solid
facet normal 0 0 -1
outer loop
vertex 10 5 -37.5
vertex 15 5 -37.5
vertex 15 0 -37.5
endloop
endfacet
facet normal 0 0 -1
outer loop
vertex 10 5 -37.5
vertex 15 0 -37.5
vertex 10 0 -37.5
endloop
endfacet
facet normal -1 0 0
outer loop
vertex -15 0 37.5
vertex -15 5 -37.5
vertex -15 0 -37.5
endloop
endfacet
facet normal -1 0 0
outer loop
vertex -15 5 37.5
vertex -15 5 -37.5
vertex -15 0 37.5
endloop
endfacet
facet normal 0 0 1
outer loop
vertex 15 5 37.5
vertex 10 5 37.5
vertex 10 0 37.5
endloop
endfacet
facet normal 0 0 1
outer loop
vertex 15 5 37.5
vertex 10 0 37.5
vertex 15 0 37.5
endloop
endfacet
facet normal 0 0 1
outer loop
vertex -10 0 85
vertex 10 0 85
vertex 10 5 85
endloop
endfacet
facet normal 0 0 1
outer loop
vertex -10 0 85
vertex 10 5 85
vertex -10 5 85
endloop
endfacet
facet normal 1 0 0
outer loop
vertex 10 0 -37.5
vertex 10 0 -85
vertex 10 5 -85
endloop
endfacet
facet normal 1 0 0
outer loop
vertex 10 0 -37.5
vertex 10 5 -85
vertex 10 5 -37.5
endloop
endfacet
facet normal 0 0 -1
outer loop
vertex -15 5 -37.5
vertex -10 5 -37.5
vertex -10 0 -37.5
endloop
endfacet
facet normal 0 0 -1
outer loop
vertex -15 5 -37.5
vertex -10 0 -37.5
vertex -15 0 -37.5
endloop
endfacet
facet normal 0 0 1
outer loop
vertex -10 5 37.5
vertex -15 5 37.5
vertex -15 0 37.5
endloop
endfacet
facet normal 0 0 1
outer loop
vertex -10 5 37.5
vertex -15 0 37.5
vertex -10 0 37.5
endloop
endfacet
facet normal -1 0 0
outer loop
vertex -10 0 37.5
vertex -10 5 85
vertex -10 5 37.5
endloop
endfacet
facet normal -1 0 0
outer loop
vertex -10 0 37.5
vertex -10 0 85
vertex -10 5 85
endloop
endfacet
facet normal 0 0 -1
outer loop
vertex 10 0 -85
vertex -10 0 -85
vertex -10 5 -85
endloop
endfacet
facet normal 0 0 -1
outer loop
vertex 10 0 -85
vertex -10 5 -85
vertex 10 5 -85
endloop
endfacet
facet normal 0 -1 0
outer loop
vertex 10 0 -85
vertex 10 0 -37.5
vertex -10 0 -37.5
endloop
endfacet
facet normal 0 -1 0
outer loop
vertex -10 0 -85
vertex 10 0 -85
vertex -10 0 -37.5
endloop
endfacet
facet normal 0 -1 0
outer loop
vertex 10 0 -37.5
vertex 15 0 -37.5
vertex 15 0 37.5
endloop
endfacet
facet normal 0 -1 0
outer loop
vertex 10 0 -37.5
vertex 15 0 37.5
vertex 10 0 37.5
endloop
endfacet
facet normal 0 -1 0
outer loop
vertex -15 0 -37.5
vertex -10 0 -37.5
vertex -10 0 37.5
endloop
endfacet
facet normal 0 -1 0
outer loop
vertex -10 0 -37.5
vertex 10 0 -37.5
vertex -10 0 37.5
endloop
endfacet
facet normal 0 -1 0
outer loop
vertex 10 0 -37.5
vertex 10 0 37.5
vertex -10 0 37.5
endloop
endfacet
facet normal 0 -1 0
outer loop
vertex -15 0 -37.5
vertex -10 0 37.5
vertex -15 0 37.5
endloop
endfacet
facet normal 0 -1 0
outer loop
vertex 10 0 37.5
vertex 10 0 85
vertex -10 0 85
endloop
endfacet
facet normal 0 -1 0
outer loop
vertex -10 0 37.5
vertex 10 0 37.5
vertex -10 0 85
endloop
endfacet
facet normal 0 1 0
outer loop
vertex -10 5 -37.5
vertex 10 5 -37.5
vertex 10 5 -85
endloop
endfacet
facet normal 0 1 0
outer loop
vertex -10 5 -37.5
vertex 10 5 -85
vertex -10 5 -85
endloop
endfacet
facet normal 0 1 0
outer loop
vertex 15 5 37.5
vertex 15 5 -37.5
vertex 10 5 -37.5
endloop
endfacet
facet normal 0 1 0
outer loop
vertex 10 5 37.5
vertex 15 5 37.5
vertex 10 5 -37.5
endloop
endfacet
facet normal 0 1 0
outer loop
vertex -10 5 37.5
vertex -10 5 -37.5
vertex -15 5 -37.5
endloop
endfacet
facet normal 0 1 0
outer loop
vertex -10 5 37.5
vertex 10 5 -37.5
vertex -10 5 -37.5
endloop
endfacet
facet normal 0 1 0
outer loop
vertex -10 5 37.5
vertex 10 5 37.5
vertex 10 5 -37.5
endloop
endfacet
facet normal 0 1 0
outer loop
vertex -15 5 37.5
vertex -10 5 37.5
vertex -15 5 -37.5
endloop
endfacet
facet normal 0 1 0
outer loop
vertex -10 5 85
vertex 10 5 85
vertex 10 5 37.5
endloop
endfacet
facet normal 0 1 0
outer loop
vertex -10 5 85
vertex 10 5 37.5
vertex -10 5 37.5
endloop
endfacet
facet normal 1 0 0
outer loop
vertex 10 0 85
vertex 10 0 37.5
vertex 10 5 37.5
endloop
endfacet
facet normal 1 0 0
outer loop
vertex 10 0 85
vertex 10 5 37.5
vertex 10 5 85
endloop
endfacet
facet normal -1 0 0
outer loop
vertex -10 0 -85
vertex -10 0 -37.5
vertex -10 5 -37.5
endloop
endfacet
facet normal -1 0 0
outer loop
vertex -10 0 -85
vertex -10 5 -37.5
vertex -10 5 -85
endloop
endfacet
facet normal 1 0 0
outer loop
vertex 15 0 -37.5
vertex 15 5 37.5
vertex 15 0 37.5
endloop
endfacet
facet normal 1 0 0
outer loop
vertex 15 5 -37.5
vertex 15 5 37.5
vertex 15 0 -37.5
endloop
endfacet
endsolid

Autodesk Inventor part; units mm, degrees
ref_plane "YZ Plane" through (0, 0, 0) normal (1, 0, 0) x (0, 1, 0)
ref_plane "XZ Plane" through (0, 0, 0) normal (0, 1, 0) x (-1, 0, 0)
ref_plane "XY Plane" through (0, 0, 0) normal (0, 0, 1) x (1, 0, 0)
sketch "Sketch1" plane through (0, 0, 0) normal (0, 1, 0) x (-1, 0, 0)
  line L0 (-10, 85) -> (10, 85)
  line L1 (10, 85) -> (10, -85)
  line L2 (10, -85) -> (-10, -85)
  line L3 (-10, -85) -> (-10, 85)
  line L4 (-10, 85) -> (10, -85) construction
  line L5 (10, 85) -> (-10, -85) construction
  point P0 (0, 0)
  dimension "d0" = 170
  dimension "d1" = 20
extrude "Extrusion1" add sketch "Sketch1" along normal blind 5
sketch "Sketch2" plane through (0, 5, 0) normal (0, 1, 0) x (1, 0, 0)
  line L0 (0, 0) -> (10.5, 0)
  line L1 (6, -37.5) -> (15, -37.5)
  line L2 (15, -37.5) -> (15, 37.5)
  line L3 (15, 37.5) -> (6, 37.5)
  line L4 (6, 37.5) -> (6, -37.5)
  line L5 (6, -37.5) -> (15, 37.5) construction
  line L6 (15, -37.5) -> (6, 37.5) construction
  line L7 (10, -85) -> (10, 85) projected
  point P0 (10, 37.5)
  point P1 (10, -37.5)
  dimension "d4" = 5
  dimension "d5" = 75
extrude "Extrusion2" add sketch "Sketch2" against normal blind 5 contours L7 L3 L2 L1
mirror "Mirror1" about plane through (0, 0, 0) normal (1, 0, 0) of "Extrusion2"
properties part number "Gel wall"
